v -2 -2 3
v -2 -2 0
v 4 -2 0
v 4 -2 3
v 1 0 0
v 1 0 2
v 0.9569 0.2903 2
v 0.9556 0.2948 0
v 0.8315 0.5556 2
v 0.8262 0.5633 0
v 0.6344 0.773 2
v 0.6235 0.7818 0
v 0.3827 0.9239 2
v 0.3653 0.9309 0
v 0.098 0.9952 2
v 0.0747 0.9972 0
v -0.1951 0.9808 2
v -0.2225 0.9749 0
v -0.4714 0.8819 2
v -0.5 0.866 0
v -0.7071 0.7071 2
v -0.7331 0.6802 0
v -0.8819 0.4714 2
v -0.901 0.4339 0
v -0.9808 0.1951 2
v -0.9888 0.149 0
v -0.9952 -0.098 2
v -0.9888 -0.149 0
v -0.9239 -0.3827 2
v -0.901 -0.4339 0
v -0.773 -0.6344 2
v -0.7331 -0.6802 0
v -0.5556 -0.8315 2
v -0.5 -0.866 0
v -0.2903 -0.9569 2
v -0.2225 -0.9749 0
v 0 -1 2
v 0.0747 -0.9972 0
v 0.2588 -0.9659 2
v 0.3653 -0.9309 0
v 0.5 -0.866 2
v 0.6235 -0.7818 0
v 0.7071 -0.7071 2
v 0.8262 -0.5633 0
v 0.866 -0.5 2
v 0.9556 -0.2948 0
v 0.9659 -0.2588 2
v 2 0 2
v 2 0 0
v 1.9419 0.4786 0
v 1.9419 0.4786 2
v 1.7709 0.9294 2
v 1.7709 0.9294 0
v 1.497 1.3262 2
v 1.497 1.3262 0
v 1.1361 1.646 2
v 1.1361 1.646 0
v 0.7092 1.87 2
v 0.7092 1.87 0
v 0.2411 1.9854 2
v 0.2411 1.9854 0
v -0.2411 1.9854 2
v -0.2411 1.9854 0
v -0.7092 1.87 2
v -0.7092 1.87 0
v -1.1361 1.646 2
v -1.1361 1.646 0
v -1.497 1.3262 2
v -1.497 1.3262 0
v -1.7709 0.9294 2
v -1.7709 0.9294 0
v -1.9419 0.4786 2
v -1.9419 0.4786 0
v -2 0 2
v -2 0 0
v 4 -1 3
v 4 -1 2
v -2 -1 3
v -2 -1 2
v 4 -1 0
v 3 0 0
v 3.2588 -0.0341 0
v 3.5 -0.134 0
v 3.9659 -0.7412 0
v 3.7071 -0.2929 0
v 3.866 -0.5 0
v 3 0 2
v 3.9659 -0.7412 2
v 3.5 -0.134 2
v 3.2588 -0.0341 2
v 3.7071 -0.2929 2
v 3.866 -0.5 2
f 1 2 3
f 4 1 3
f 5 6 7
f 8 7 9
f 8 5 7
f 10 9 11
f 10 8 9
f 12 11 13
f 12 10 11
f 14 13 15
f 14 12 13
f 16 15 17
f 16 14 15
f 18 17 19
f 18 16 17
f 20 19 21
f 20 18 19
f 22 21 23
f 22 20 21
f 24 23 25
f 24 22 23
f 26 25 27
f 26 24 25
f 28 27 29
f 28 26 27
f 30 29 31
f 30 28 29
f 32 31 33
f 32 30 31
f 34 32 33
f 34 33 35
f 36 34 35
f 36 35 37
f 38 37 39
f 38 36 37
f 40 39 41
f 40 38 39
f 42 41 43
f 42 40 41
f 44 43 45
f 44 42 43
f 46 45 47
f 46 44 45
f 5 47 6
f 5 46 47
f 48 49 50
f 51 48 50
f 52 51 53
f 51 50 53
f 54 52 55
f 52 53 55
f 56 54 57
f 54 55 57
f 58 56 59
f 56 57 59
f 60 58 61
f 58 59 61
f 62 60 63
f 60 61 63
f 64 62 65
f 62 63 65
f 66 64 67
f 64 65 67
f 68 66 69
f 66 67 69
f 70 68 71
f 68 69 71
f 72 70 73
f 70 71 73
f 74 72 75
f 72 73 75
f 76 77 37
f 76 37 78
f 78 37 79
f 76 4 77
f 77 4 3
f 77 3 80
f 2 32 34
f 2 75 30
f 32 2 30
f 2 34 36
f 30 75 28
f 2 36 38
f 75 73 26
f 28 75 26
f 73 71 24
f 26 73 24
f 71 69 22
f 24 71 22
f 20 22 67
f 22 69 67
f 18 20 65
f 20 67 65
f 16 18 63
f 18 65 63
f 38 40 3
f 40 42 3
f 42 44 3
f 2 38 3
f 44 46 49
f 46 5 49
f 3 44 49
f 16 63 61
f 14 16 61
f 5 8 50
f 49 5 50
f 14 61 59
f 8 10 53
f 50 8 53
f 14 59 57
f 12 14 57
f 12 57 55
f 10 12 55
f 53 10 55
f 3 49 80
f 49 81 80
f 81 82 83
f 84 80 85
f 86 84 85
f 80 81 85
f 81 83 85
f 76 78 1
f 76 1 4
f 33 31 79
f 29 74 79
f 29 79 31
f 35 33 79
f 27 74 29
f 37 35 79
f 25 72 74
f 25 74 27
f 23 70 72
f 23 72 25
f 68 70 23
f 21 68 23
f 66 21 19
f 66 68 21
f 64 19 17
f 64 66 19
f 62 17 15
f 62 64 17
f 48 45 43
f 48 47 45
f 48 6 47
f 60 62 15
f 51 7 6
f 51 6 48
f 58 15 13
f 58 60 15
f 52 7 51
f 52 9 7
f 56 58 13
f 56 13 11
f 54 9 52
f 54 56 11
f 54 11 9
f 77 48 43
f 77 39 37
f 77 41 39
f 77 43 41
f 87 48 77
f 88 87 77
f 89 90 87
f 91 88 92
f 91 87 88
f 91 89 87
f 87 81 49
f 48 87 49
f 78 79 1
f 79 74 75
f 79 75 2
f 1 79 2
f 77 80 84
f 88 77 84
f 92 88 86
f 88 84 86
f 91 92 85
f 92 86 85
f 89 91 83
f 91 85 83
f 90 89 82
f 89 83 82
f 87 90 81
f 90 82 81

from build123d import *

# Parameters (mm, degrees)
SKETCH_1_R      = 1
EXTRUDE_1_DEPTH = 2
EXTRUDE_2_DEPTH = 3


with BuildPart() as part:
    # 草圖1 → 填料-伸長1 (new body)
    with BuildSketch(Plane.XY):
        with BuildLine():
            Line((-2, 0), (-2, -2))
            Line((-2, -2), (4, -2))
            Line((4, -2), (4, -1))
            ThreePointArc((4, -1), (3.707106781, -0.292893219), (3, 0))
            Line((3, 0), (2, 0))
            ThreePointArc((2, 0), (0, 2), (-2, 0))
        make_face()
        Circle(SKETCH_1_R, mode=Mode.SUBTRACT)
    extrude(amount=EXTRUDE_1_DEPTH)

    # 草圖1<3> → 填料-伸長2 (add)
    with BuildSketch(Plane.XY):
        Polygon((0, -1), (-2, -1), (-2, -2), (4, -2), (4, -1), align=None)
    extrude(amount=EXTRUDE_2_DEPTH)


solid = part.part
